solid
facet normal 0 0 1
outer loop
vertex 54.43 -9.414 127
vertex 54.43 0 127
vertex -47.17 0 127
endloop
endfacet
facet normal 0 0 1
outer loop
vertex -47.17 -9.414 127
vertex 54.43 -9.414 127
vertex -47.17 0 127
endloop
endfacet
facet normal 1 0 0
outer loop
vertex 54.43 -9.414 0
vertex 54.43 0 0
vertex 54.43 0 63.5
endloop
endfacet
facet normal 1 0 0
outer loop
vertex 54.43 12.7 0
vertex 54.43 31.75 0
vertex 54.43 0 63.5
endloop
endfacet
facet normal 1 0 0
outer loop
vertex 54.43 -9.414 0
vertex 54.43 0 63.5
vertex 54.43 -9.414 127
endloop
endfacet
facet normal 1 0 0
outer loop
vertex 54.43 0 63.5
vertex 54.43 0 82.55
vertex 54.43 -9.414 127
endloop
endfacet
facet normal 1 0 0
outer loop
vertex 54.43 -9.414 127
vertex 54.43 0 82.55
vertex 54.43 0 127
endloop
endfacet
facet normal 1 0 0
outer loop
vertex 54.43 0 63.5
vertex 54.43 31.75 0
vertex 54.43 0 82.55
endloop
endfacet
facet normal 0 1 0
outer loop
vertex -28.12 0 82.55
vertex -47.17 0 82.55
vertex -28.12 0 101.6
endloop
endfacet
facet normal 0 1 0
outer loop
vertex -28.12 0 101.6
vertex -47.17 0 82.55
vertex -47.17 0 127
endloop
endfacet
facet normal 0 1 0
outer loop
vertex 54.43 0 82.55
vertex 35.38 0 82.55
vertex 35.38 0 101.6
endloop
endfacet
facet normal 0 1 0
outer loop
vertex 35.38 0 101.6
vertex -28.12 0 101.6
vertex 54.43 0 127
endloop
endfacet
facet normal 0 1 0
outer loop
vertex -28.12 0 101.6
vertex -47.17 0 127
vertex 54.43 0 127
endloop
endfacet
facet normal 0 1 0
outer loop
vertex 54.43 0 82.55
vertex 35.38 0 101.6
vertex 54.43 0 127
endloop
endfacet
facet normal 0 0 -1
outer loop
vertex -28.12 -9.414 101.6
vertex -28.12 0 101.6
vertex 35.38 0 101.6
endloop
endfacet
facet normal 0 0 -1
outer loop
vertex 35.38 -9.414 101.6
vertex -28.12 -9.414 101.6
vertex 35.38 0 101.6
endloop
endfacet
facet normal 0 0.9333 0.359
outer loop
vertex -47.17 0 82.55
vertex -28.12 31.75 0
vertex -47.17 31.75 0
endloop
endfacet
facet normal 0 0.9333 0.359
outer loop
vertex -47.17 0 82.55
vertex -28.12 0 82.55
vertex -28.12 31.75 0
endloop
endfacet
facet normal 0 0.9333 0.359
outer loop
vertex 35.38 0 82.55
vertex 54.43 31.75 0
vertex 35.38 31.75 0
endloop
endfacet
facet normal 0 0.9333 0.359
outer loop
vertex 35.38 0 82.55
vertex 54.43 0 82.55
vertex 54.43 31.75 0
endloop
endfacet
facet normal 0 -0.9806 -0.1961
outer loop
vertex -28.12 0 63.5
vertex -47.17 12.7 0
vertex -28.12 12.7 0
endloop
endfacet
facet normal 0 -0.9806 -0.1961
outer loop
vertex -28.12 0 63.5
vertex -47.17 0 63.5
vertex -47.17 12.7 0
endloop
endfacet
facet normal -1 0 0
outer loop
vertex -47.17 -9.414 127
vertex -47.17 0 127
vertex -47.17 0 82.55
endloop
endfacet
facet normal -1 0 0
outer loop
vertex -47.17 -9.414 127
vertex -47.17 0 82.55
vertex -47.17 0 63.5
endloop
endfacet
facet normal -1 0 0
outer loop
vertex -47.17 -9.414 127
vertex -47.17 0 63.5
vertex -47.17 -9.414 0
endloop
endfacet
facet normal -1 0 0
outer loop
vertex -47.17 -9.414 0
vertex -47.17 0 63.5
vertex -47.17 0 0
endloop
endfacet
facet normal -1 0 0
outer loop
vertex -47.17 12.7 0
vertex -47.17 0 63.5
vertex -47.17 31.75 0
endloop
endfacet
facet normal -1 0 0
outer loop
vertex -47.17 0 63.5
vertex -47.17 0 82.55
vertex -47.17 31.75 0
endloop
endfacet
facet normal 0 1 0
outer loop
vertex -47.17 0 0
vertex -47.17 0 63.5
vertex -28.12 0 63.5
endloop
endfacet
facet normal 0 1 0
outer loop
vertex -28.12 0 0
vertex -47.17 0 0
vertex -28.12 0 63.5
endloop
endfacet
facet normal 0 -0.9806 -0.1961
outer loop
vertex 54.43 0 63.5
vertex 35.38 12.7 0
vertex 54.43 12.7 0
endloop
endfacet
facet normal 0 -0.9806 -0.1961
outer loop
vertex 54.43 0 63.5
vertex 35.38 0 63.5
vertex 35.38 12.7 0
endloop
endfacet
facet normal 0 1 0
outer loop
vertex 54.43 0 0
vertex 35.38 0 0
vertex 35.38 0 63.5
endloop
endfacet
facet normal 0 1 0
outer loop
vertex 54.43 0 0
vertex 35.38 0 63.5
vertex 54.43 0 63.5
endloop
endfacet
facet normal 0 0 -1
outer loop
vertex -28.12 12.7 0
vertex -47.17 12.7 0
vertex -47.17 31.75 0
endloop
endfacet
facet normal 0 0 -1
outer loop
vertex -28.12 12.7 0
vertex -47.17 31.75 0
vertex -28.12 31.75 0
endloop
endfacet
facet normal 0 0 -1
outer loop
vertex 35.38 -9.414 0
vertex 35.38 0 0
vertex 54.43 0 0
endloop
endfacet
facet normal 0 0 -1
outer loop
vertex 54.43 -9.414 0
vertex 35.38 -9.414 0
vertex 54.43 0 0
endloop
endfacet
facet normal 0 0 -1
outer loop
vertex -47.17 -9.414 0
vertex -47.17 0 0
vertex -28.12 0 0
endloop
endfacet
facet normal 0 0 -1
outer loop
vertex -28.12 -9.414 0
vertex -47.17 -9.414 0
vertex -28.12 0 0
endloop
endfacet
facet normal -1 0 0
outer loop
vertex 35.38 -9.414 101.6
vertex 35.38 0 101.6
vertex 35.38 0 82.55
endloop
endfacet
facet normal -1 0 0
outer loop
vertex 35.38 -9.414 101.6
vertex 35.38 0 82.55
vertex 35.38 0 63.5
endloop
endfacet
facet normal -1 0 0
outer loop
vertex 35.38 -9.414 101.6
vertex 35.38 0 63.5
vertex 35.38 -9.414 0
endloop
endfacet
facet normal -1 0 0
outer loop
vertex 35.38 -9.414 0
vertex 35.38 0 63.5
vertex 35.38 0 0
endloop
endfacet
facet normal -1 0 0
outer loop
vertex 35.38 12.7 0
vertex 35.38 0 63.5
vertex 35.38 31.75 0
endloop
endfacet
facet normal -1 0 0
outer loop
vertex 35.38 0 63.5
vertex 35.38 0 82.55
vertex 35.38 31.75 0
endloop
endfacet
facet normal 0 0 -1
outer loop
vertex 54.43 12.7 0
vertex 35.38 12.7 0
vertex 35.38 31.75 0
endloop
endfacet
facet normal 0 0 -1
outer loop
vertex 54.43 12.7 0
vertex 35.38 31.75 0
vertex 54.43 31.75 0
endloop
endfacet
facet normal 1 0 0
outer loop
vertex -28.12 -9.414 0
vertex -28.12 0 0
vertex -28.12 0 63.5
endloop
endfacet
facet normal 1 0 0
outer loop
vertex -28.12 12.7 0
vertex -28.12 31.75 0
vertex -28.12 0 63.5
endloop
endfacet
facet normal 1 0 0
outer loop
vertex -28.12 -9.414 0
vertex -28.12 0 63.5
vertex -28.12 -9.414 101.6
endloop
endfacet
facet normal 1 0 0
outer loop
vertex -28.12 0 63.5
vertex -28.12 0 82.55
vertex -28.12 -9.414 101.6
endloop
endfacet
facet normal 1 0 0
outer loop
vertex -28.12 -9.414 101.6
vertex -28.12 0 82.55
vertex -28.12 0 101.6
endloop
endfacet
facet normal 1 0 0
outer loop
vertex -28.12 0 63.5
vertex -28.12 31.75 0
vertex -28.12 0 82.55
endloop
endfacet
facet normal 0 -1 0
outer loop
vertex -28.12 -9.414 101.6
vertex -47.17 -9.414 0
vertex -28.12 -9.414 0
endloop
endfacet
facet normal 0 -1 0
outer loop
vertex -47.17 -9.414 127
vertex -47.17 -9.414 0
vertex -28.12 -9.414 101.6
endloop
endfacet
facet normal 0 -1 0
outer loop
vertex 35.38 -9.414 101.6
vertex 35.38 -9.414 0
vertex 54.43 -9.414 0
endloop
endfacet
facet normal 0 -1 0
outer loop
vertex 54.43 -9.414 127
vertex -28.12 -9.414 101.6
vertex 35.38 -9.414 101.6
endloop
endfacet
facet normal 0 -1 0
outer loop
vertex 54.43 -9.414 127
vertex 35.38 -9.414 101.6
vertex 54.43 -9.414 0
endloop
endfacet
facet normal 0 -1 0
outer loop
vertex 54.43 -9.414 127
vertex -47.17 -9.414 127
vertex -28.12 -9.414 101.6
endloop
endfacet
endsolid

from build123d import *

# Parameters (mm, degrees)
F1_W     = 19.05
F1_H     = 19.05
F0_W     = 19.05
F0_H     = 19.05
F0_H_2   = 25.4
F0_W_2   = 63.5
F0_H_3   = 63.5
F4_DEPTH = 9.4144362956


with BuildPart() as f2:
    # F1 (on Top) → F2 section 0
    with BuildSketch(Plane.XY):
        with Locations((44.9054742098, 22.225)):
            Rectangle(F1_W, F1_H)
    # F0 (on Front) → F2 section 1
    with BuildSketch(Plane.XZ):
        with Locations((44.9054742098, 73.025)):
            Rectangle(F0_W, F0_H)
    loft()



with BuildPart() as f3:
    # F1 (on Top) → F3 section 0
    with BuildSketch(Plane.XY):
        with Locations((-37.6445257902, 22.225)):
            Rectangle(F1_W, F1_H)
    # F0 (on Front) → F3 section 1
    with BuildSketch(Plane.XZ):
        with Locations((-37.6445257902, 73.025)):
            Rectangle(F0_W, F0_H)
    loft()


with BuildPart() as f2_1:
    add(f2.part)

    add(f3.part)  # F4 merges F3
    # F0 (on Front) → F4 (join)
    with BuildSketch(Plane.XZ):
        with Locations((-37.6445257902, 92.075)):
            Rectangle(F0_W, F0_H)
        with Locations((-37.6445257902, 114.3)):
            Rectangle(F0_W, F0_H_2)
        with Locations((3.6304742098, 114.3)):
            Rectangle(F0_W_2, F0_H_2)
        with Locations((44.9054742098, 114.3)):
            Rectangle(F0_W, F0_H_2)
        with Locations((44.9054742098, 92.075)):
            Rectangle(F0_W, F0_H)
        with Locations((-37.6445257902, 31.75)):
            Rectangle(F0_W, F0_H_3)
        with Locations((-37.6445257902, 73.025)):
            Rectangle(F0_W, F0_H)
        with Locations((44.9054742098, 31.75)):
            Rectangle(F0_W, F0_H_3)
        with Locations((44.9054742098, 73.025)):
            Rectangle(F0_W, F0_H)
    extrude(amount=F4_DEPTH)


solid = f2_1.part
